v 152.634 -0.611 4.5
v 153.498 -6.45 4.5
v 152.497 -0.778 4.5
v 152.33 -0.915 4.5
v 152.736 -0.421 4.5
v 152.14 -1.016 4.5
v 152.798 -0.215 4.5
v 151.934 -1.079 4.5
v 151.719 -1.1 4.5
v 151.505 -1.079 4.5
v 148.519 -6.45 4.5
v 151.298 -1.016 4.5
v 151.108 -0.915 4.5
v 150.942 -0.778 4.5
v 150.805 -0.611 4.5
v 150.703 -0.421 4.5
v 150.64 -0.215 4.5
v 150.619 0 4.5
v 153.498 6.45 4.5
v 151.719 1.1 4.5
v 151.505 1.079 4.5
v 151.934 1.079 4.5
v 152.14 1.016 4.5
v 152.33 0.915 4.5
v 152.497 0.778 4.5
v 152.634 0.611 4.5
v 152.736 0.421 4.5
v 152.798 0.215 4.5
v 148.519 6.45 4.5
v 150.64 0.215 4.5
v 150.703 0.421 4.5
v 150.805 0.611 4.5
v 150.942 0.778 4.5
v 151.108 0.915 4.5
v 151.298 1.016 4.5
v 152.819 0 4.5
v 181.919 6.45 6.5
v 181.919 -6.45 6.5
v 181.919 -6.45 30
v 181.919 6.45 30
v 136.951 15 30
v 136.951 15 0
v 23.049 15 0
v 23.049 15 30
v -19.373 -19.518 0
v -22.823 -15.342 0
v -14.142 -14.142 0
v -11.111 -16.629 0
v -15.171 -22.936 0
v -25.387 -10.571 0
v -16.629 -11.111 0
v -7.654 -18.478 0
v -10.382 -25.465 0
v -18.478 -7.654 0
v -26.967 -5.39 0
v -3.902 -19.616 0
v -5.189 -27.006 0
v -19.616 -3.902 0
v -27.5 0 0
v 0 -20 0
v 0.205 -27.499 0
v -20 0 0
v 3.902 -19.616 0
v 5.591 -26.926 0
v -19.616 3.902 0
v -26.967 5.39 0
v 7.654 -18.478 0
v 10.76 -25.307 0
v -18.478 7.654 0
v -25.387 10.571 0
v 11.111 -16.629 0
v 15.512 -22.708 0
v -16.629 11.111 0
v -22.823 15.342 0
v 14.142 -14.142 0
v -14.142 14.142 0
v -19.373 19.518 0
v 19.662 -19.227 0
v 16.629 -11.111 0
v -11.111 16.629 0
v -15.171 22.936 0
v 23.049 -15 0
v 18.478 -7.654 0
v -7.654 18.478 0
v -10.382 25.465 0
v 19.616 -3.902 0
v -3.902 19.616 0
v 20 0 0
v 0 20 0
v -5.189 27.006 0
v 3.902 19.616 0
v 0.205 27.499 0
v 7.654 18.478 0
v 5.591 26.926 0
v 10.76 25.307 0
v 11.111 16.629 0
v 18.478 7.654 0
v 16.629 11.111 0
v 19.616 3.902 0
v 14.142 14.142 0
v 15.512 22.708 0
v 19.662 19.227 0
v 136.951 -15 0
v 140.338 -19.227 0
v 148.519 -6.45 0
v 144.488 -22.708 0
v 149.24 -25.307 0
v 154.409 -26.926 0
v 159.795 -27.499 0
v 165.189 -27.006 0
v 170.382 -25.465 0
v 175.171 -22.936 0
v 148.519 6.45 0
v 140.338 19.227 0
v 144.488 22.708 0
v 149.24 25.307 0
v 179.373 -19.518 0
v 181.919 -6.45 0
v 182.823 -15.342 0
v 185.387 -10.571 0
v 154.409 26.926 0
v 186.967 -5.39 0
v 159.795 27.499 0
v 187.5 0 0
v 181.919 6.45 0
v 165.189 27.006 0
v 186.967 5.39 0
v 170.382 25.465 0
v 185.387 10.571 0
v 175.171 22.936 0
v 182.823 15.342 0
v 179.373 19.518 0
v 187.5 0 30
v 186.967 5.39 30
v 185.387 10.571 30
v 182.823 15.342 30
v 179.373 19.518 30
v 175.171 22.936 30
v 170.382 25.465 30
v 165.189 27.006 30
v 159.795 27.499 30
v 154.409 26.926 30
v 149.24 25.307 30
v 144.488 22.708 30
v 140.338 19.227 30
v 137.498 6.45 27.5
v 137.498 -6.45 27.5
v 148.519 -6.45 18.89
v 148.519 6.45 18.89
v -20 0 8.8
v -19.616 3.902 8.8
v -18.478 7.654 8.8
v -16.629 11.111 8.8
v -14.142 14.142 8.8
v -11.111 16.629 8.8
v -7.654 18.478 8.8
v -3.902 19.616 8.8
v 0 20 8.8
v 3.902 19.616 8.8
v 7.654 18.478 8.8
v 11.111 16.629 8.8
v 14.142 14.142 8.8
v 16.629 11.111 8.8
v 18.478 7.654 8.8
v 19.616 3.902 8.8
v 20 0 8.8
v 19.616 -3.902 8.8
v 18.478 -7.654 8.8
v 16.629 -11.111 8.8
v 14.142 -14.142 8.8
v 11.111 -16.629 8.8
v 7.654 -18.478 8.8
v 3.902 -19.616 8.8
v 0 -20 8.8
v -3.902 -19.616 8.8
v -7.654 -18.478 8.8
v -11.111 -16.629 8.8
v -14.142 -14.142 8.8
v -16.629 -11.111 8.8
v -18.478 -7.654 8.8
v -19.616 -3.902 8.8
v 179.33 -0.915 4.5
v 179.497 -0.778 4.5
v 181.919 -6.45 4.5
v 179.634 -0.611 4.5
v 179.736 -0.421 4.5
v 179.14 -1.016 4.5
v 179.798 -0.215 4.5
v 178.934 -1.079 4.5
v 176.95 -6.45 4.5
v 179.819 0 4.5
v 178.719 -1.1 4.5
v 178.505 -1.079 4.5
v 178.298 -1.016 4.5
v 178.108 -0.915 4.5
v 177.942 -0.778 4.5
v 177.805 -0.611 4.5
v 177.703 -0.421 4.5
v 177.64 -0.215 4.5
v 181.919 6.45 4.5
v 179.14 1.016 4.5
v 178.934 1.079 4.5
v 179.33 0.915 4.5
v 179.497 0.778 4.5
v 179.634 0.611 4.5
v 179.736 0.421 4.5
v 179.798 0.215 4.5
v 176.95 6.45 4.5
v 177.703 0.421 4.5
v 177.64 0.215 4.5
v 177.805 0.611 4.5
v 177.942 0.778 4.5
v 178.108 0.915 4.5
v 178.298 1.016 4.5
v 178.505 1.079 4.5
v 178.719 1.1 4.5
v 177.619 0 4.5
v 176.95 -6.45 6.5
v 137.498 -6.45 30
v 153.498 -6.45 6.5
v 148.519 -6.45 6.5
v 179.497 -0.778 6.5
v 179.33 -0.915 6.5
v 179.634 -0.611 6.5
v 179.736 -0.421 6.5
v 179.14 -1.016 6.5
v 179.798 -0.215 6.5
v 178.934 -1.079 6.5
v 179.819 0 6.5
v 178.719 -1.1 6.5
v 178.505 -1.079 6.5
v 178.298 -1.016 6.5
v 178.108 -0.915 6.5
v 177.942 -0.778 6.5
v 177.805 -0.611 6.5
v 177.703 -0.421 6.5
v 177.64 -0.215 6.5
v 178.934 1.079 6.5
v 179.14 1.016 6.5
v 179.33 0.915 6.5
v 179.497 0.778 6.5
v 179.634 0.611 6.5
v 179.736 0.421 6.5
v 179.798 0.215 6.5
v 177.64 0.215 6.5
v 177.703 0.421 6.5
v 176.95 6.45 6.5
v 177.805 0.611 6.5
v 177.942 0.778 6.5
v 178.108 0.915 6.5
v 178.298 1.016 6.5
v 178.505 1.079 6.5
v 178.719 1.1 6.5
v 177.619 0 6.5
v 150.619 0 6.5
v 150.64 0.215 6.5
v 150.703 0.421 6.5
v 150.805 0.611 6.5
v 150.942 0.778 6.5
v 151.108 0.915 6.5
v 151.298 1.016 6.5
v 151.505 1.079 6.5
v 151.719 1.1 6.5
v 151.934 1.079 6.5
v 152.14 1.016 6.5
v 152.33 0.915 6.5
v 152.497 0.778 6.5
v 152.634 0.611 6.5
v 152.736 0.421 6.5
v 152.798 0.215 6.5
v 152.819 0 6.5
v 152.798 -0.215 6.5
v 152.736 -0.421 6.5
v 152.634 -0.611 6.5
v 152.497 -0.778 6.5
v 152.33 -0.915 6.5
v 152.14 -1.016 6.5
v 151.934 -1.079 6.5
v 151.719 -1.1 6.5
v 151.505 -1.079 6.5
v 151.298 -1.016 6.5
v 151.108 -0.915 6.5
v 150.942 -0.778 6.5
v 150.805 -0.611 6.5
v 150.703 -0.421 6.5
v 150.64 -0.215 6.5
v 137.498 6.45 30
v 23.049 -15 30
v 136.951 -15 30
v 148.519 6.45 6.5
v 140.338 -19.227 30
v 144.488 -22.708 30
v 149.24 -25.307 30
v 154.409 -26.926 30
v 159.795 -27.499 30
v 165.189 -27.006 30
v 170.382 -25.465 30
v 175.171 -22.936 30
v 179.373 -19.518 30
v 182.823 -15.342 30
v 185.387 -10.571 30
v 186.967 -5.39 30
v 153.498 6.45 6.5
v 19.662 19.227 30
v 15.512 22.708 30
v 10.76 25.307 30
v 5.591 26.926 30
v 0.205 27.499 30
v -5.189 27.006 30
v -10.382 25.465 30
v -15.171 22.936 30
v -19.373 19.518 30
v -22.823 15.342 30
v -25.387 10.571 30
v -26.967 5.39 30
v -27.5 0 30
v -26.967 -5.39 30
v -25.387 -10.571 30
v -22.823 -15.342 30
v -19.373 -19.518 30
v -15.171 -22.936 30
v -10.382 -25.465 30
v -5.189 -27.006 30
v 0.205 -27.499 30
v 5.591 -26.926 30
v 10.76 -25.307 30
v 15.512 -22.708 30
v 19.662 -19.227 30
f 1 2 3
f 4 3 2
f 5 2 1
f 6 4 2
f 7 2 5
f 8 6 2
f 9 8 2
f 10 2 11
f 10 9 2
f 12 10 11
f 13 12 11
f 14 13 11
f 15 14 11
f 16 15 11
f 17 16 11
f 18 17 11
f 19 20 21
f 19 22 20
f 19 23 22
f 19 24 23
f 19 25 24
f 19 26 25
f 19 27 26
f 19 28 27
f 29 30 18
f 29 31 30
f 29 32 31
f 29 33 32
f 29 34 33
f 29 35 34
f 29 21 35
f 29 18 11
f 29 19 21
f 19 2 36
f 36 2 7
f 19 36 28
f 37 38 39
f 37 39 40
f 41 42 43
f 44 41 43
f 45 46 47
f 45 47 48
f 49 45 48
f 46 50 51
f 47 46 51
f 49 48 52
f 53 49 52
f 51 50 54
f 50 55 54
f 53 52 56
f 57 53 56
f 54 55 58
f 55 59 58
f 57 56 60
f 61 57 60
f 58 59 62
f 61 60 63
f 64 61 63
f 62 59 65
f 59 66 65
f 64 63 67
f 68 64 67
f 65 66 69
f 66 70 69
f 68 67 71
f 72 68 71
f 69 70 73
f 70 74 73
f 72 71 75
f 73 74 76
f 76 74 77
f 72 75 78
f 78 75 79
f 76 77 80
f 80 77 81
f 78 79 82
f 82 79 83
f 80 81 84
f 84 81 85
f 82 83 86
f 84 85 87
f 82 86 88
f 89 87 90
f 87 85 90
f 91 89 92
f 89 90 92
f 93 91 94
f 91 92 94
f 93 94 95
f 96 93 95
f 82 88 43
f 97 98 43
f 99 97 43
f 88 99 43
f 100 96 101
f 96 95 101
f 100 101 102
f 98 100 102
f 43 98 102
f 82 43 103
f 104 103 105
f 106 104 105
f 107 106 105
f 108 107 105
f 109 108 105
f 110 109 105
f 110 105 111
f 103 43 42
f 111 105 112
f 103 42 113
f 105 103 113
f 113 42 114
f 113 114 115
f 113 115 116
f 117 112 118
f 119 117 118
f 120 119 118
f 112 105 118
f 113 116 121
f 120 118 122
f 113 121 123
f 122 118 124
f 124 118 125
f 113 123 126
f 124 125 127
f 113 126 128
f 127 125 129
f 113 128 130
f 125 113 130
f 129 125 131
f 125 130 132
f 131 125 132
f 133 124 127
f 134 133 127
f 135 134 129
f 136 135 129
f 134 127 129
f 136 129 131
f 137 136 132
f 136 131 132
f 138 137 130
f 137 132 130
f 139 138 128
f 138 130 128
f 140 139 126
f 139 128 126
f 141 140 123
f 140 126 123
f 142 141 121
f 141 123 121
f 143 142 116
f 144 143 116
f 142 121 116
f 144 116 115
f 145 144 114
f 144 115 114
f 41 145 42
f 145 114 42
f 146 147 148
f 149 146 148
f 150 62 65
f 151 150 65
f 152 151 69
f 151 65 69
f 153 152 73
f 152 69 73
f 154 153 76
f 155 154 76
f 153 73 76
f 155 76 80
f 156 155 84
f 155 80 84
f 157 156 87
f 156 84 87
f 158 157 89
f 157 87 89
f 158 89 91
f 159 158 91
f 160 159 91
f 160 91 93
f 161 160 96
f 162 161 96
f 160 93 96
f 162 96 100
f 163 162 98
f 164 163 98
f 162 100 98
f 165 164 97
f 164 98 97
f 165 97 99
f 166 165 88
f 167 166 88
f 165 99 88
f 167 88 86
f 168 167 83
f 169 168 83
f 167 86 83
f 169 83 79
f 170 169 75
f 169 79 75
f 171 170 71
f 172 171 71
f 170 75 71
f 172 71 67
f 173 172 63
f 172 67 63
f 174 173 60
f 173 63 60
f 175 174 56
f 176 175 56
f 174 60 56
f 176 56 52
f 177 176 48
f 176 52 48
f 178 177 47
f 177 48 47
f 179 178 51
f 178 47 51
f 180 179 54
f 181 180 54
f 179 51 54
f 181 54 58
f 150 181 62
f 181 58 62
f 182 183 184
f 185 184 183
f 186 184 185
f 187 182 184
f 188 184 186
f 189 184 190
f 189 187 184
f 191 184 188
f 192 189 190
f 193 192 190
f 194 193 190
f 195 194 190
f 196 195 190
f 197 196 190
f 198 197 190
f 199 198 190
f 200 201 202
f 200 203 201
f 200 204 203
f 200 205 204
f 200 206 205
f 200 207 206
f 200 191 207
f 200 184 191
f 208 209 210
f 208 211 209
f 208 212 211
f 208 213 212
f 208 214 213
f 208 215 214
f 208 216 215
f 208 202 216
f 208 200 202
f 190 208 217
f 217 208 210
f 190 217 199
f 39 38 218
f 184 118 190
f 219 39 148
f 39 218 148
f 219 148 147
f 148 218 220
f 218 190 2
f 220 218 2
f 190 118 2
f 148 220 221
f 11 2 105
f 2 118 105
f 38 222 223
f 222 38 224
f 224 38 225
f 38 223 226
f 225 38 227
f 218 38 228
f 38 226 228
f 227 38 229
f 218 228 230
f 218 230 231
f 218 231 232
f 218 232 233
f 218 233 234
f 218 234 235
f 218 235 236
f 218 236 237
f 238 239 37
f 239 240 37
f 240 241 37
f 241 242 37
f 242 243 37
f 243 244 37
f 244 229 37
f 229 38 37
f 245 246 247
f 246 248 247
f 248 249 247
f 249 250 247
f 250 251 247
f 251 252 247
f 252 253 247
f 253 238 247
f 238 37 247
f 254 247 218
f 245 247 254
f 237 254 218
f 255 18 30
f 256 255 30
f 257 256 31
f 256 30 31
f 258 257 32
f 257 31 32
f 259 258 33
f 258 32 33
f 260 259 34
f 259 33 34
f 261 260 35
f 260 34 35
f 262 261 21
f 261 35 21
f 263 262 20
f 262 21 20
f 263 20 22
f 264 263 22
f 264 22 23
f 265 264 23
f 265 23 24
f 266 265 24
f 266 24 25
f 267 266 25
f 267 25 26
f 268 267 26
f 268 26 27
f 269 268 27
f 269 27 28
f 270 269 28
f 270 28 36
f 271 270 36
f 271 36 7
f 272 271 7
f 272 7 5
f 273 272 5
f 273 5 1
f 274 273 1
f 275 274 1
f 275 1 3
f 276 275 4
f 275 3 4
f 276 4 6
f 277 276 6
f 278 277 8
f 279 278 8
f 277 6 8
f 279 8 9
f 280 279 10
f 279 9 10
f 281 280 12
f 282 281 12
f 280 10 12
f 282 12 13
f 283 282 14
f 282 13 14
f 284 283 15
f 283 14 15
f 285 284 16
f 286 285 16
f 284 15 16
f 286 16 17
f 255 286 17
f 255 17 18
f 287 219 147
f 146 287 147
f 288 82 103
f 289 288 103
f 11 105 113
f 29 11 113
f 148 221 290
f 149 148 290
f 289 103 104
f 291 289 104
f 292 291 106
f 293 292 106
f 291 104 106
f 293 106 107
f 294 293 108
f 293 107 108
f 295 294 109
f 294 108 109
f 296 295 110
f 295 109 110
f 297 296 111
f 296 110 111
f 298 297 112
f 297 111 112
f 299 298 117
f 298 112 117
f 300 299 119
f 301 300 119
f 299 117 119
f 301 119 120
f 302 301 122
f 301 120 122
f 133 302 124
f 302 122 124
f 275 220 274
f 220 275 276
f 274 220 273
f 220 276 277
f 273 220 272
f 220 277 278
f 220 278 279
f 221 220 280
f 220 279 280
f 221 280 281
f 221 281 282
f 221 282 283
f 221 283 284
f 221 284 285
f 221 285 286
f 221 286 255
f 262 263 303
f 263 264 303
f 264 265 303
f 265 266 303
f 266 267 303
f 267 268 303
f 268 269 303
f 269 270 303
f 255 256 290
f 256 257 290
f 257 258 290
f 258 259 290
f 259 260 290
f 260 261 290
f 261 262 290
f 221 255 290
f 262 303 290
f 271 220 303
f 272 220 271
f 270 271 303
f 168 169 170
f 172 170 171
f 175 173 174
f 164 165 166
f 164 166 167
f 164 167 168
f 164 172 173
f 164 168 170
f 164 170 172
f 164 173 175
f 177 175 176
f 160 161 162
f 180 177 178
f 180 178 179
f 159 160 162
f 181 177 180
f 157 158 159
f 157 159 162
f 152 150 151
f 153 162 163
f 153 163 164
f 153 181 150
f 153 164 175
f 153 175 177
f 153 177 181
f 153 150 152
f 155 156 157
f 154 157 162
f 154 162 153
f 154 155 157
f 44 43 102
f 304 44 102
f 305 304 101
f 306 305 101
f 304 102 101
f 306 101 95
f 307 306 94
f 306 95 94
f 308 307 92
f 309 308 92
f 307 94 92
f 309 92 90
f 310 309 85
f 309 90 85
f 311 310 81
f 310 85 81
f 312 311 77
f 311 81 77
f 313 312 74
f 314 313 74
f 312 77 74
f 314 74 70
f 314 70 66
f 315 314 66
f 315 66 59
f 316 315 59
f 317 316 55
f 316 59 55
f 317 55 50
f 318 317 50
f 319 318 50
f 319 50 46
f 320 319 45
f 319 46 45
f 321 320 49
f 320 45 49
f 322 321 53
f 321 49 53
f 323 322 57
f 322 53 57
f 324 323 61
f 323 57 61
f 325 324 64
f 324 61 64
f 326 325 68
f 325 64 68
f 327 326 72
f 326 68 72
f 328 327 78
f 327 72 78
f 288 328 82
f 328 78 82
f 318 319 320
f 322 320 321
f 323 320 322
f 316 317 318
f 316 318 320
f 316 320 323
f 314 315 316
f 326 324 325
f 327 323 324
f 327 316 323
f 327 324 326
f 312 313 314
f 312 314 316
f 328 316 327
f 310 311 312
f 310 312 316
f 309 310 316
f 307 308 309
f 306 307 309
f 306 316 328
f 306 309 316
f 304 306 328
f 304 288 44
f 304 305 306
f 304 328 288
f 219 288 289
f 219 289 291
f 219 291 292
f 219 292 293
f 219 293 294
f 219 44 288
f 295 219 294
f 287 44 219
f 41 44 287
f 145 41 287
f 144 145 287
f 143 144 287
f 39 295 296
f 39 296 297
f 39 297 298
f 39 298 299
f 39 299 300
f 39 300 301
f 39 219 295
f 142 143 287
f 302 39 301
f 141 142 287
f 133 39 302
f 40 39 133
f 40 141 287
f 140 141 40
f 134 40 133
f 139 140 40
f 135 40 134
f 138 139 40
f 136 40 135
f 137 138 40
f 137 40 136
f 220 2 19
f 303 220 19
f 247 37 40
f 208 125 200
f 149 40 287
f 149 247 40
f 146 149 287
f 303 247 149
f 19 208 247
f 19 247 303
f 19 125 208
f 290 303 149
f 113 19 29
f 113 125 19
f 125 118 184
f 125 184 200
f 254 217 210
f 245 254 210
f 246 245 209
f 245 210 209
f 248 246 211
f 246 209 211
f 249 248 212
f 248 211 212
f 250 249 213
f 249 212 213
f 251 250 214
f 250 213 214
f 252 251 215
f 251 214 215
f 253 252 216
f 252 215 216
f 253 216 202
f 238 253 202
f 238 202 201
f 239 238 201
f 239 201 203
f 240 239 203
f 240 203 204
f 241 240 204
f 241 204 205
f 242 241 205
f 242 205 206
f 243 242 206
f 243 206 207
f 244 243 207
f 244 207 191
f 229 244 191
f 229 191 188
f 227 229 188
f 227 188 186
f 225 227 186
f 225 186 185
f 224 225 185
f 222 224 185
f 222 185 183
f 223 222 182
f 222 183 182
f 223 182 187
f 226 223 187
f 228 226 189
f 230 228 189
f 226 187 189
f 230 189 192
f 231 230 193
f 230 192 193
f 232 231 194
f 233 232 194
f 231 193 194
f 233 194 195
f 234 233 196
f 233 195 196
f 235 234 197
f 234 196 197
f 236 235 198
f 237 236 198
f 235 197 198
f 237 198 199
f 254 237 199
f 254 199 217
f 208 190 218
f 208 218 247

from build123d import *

# Parameters (mm, degrees)
BOSS_EXTRUDE1_DEPTH = 30
SKETCH16_W          = 33.4
SKETCH16_H          = 12.9
CUT_EXTRUDE10_DEPTH = 4.5
SKETCH17_W          = 23.45208563
SKETCH17_H          = 12.9
CUT_EXTRUDE11_DEPTH = 192.865838543
CUT_EXTRUDE13_DEPTH = 6.45
SKETCH19_R          = 20
CUT_EXTRUDE14_DEPTH = 8.8
SKETCH21_W          = 33.4
SKETCH21_H          = 12.9
CUT_EXTRUDE15_DEPTH = 191.957455995
SKETCH23_R          = 1.1
CUT_EXTRUDE16_DEPTH = 192.865838543


with BuildPart() as part:
    # Sketch1 → Boss-Extrude1 (new body)
    with BuildSketch(Plane.XY):
        with BuildLine():
            ThreePointArc((187.5, 0), (167.823244805, 26.363741023), (136.951138857, 15))
            Line((136.951138857, 15), (160, 15))
            Line((160, 15), (160, -15))
            Line((160, -15), (136.951138857, -15))
            ThreePointArc((136.951138857, -15), (167.823244805, -26.363741023), (187.5, 0))
        make_face()
        with BuildLine():
            Line((160, 15), (136.951138857, 15))
            ThreePointArc((136.951138857, 15), (132.5, 0), (136.951138857, -15))
            Line((136.951138857, -15), (160, -15))
            Line((160, -15), (160, 15))
        make_face()
        with BuildLine():
            Line((136.951138857, 15), (23.048861143, 15))
            ThreePointArc((23.048861143, 15), (26.363741023, 7.823244805), (27.5, 0))
            ThreePointArc((27.5, 0), (26.363741023, -7.823244805), (23.048861143, -15))
            Line((23.048861143, -15), (136.951138857, -15))
            ThreePointArc((136.951138857, -15), (132.5, 0), (136.951138857, 15))
        make_face()
        with BuildLine():
            ThreePointArc((13.228756555, -15), (-20, 0), (13.228756555, 15))
            Line((13.228756555, 15), (23.048861143, 15))
            ThreePointArc((23.048861143, 15), (-27.5, 0), (23.048861143, -15))
            Line((23.048861143, -15), (13.228756555, -15))
        make_face()
        with BuildLine():
            Line((23.048861143, 15), (13.228756555, 15))
            ThreePointArc((13.228756555, 15), (18.228756555, 8.228756555), (20, 0))
            ThreePointArc((20, 0), (18.228756555, -8.228756555), (13.228756555, -15))
            Line((13.228756555, -15), (23.048861143, -15))
            ThreePointArc((23.048861143, -15), (26.363741023, -7.823244805), (27.5, 0))
            ThreePointArc((27.5, 0), (26.363741023, 7.823244805), (23.048861143, 15))
        make_face()
        with BuildLine():
            Line((0, -15), (0, 15))
            Line((0, 15), (13.228756555, 15))
            ThreePointArc((13.228756555, 15), (-20, 0), (13.228756555, -15))
            Line((13.228756555, -15), (0, -15))
        make_face()
        with BuildLine():
            Line((13.228756555, 15), (0, 15))
            Line((0, 15), (0, -15))
            Line((0, -15), (13.228756555, -15))
            ThreePointArc((13.228756555, -15), (18.228756555, -8.228756555), (20, 0))
            ThreePointArc((20, 0), (18.228756555, 8.228756555), (13.228756555, 15))
        make_face()
    extrude(amount=BOSS_EXTRUDE1_DEPTH)

    # Sketch16 → Cut-Extrude10 (cut)
    with BuildSketch(Plane(origin=(0, 0, 0), x_dir=(-1, 0, 0), z_dir=(0, 0, -1))):
        with Locations((-165.21934279, 0)):
            Rectangle(SKETCH16_W, SKETCH16_H)
    extrude(amount=-CUT_EXTRUDE10_DEPTH, mode=Mode.SUBTRACT)

    # Sketch17 → Cut-Extrude11 (cut, through all)
    with BuildSketch(Plane(origin=(0, 0, 0), x_dir=(-1, 0, 0), z_dir=(0, 0, -1))):
        with Locations((-165.223957185, 0)):
            Rectangle(SKETCH17_W, SKETCH17_H)
    extrude(amount=-CUT_EXTRUDE11_DEPTH, mode=Mode.SUBTRACT)

    # Sketch18 → Cut-Extrude13 (cut, symmetric)
    with BuildSketch(Plane(origin=(0, 0, 0), x_dir=(-1, 0, 0), z_dir=(0, -1, 0))):
        Polygon((-153.49791437, -15), (-153.49791437, -30), (-137.49791437, -30), (-137.49791437, -27.5), align=None)
    extrude(amount=CUT_EXTRUDE13_DEPTH, both=True, mode=Mode.SUBTRACT)

    # Sketch19 → Cut-Extrude14 (cut)
    with BuildSketch(Plane(origin=(0, 0, 0), x_dir=(-1, 0, 0), z_dir=(0, 0, -1))):
        Circle(SKETCH19_R)
    extrude(amount=-CUT_EXTRUDE14_DEPTH, mode=Mode.SUBTRACT)

    # Sketch21 → Cut-Extrude15 (cut, through all)
    with BuildSketch(Plane(origin=(0, 0, 6.5), x_dir=(-1, 0, 0), z_dir=(0, 0, -1))):
        with Locations((-165.21934279, 0)):
            Rectangle(SKETCH21_W, SKETCH21_H)
    extrude(amount=-CUT_EXTRUDE15_DEPTH, mode=Mode.SUBTRACT)

    # Sketch23 → Cut-Extrude16 (cut, through all)
    with BuildSketch(Plane(origin=(0, 0, 0), x_dir=(-1, 0, 0), z_dir=(0, 0, -1))):
        with Locations((-151.71934279, 0)):
            Circle(SKETCH23_R)
        with Locations((-178.71934279, 0)):
            Circle(SKETCH23_R)
    extrude(amount=-CUT_EXTRUDE16_DEPTH, mode=Mode.SUBTRACT)


solid = part.part
